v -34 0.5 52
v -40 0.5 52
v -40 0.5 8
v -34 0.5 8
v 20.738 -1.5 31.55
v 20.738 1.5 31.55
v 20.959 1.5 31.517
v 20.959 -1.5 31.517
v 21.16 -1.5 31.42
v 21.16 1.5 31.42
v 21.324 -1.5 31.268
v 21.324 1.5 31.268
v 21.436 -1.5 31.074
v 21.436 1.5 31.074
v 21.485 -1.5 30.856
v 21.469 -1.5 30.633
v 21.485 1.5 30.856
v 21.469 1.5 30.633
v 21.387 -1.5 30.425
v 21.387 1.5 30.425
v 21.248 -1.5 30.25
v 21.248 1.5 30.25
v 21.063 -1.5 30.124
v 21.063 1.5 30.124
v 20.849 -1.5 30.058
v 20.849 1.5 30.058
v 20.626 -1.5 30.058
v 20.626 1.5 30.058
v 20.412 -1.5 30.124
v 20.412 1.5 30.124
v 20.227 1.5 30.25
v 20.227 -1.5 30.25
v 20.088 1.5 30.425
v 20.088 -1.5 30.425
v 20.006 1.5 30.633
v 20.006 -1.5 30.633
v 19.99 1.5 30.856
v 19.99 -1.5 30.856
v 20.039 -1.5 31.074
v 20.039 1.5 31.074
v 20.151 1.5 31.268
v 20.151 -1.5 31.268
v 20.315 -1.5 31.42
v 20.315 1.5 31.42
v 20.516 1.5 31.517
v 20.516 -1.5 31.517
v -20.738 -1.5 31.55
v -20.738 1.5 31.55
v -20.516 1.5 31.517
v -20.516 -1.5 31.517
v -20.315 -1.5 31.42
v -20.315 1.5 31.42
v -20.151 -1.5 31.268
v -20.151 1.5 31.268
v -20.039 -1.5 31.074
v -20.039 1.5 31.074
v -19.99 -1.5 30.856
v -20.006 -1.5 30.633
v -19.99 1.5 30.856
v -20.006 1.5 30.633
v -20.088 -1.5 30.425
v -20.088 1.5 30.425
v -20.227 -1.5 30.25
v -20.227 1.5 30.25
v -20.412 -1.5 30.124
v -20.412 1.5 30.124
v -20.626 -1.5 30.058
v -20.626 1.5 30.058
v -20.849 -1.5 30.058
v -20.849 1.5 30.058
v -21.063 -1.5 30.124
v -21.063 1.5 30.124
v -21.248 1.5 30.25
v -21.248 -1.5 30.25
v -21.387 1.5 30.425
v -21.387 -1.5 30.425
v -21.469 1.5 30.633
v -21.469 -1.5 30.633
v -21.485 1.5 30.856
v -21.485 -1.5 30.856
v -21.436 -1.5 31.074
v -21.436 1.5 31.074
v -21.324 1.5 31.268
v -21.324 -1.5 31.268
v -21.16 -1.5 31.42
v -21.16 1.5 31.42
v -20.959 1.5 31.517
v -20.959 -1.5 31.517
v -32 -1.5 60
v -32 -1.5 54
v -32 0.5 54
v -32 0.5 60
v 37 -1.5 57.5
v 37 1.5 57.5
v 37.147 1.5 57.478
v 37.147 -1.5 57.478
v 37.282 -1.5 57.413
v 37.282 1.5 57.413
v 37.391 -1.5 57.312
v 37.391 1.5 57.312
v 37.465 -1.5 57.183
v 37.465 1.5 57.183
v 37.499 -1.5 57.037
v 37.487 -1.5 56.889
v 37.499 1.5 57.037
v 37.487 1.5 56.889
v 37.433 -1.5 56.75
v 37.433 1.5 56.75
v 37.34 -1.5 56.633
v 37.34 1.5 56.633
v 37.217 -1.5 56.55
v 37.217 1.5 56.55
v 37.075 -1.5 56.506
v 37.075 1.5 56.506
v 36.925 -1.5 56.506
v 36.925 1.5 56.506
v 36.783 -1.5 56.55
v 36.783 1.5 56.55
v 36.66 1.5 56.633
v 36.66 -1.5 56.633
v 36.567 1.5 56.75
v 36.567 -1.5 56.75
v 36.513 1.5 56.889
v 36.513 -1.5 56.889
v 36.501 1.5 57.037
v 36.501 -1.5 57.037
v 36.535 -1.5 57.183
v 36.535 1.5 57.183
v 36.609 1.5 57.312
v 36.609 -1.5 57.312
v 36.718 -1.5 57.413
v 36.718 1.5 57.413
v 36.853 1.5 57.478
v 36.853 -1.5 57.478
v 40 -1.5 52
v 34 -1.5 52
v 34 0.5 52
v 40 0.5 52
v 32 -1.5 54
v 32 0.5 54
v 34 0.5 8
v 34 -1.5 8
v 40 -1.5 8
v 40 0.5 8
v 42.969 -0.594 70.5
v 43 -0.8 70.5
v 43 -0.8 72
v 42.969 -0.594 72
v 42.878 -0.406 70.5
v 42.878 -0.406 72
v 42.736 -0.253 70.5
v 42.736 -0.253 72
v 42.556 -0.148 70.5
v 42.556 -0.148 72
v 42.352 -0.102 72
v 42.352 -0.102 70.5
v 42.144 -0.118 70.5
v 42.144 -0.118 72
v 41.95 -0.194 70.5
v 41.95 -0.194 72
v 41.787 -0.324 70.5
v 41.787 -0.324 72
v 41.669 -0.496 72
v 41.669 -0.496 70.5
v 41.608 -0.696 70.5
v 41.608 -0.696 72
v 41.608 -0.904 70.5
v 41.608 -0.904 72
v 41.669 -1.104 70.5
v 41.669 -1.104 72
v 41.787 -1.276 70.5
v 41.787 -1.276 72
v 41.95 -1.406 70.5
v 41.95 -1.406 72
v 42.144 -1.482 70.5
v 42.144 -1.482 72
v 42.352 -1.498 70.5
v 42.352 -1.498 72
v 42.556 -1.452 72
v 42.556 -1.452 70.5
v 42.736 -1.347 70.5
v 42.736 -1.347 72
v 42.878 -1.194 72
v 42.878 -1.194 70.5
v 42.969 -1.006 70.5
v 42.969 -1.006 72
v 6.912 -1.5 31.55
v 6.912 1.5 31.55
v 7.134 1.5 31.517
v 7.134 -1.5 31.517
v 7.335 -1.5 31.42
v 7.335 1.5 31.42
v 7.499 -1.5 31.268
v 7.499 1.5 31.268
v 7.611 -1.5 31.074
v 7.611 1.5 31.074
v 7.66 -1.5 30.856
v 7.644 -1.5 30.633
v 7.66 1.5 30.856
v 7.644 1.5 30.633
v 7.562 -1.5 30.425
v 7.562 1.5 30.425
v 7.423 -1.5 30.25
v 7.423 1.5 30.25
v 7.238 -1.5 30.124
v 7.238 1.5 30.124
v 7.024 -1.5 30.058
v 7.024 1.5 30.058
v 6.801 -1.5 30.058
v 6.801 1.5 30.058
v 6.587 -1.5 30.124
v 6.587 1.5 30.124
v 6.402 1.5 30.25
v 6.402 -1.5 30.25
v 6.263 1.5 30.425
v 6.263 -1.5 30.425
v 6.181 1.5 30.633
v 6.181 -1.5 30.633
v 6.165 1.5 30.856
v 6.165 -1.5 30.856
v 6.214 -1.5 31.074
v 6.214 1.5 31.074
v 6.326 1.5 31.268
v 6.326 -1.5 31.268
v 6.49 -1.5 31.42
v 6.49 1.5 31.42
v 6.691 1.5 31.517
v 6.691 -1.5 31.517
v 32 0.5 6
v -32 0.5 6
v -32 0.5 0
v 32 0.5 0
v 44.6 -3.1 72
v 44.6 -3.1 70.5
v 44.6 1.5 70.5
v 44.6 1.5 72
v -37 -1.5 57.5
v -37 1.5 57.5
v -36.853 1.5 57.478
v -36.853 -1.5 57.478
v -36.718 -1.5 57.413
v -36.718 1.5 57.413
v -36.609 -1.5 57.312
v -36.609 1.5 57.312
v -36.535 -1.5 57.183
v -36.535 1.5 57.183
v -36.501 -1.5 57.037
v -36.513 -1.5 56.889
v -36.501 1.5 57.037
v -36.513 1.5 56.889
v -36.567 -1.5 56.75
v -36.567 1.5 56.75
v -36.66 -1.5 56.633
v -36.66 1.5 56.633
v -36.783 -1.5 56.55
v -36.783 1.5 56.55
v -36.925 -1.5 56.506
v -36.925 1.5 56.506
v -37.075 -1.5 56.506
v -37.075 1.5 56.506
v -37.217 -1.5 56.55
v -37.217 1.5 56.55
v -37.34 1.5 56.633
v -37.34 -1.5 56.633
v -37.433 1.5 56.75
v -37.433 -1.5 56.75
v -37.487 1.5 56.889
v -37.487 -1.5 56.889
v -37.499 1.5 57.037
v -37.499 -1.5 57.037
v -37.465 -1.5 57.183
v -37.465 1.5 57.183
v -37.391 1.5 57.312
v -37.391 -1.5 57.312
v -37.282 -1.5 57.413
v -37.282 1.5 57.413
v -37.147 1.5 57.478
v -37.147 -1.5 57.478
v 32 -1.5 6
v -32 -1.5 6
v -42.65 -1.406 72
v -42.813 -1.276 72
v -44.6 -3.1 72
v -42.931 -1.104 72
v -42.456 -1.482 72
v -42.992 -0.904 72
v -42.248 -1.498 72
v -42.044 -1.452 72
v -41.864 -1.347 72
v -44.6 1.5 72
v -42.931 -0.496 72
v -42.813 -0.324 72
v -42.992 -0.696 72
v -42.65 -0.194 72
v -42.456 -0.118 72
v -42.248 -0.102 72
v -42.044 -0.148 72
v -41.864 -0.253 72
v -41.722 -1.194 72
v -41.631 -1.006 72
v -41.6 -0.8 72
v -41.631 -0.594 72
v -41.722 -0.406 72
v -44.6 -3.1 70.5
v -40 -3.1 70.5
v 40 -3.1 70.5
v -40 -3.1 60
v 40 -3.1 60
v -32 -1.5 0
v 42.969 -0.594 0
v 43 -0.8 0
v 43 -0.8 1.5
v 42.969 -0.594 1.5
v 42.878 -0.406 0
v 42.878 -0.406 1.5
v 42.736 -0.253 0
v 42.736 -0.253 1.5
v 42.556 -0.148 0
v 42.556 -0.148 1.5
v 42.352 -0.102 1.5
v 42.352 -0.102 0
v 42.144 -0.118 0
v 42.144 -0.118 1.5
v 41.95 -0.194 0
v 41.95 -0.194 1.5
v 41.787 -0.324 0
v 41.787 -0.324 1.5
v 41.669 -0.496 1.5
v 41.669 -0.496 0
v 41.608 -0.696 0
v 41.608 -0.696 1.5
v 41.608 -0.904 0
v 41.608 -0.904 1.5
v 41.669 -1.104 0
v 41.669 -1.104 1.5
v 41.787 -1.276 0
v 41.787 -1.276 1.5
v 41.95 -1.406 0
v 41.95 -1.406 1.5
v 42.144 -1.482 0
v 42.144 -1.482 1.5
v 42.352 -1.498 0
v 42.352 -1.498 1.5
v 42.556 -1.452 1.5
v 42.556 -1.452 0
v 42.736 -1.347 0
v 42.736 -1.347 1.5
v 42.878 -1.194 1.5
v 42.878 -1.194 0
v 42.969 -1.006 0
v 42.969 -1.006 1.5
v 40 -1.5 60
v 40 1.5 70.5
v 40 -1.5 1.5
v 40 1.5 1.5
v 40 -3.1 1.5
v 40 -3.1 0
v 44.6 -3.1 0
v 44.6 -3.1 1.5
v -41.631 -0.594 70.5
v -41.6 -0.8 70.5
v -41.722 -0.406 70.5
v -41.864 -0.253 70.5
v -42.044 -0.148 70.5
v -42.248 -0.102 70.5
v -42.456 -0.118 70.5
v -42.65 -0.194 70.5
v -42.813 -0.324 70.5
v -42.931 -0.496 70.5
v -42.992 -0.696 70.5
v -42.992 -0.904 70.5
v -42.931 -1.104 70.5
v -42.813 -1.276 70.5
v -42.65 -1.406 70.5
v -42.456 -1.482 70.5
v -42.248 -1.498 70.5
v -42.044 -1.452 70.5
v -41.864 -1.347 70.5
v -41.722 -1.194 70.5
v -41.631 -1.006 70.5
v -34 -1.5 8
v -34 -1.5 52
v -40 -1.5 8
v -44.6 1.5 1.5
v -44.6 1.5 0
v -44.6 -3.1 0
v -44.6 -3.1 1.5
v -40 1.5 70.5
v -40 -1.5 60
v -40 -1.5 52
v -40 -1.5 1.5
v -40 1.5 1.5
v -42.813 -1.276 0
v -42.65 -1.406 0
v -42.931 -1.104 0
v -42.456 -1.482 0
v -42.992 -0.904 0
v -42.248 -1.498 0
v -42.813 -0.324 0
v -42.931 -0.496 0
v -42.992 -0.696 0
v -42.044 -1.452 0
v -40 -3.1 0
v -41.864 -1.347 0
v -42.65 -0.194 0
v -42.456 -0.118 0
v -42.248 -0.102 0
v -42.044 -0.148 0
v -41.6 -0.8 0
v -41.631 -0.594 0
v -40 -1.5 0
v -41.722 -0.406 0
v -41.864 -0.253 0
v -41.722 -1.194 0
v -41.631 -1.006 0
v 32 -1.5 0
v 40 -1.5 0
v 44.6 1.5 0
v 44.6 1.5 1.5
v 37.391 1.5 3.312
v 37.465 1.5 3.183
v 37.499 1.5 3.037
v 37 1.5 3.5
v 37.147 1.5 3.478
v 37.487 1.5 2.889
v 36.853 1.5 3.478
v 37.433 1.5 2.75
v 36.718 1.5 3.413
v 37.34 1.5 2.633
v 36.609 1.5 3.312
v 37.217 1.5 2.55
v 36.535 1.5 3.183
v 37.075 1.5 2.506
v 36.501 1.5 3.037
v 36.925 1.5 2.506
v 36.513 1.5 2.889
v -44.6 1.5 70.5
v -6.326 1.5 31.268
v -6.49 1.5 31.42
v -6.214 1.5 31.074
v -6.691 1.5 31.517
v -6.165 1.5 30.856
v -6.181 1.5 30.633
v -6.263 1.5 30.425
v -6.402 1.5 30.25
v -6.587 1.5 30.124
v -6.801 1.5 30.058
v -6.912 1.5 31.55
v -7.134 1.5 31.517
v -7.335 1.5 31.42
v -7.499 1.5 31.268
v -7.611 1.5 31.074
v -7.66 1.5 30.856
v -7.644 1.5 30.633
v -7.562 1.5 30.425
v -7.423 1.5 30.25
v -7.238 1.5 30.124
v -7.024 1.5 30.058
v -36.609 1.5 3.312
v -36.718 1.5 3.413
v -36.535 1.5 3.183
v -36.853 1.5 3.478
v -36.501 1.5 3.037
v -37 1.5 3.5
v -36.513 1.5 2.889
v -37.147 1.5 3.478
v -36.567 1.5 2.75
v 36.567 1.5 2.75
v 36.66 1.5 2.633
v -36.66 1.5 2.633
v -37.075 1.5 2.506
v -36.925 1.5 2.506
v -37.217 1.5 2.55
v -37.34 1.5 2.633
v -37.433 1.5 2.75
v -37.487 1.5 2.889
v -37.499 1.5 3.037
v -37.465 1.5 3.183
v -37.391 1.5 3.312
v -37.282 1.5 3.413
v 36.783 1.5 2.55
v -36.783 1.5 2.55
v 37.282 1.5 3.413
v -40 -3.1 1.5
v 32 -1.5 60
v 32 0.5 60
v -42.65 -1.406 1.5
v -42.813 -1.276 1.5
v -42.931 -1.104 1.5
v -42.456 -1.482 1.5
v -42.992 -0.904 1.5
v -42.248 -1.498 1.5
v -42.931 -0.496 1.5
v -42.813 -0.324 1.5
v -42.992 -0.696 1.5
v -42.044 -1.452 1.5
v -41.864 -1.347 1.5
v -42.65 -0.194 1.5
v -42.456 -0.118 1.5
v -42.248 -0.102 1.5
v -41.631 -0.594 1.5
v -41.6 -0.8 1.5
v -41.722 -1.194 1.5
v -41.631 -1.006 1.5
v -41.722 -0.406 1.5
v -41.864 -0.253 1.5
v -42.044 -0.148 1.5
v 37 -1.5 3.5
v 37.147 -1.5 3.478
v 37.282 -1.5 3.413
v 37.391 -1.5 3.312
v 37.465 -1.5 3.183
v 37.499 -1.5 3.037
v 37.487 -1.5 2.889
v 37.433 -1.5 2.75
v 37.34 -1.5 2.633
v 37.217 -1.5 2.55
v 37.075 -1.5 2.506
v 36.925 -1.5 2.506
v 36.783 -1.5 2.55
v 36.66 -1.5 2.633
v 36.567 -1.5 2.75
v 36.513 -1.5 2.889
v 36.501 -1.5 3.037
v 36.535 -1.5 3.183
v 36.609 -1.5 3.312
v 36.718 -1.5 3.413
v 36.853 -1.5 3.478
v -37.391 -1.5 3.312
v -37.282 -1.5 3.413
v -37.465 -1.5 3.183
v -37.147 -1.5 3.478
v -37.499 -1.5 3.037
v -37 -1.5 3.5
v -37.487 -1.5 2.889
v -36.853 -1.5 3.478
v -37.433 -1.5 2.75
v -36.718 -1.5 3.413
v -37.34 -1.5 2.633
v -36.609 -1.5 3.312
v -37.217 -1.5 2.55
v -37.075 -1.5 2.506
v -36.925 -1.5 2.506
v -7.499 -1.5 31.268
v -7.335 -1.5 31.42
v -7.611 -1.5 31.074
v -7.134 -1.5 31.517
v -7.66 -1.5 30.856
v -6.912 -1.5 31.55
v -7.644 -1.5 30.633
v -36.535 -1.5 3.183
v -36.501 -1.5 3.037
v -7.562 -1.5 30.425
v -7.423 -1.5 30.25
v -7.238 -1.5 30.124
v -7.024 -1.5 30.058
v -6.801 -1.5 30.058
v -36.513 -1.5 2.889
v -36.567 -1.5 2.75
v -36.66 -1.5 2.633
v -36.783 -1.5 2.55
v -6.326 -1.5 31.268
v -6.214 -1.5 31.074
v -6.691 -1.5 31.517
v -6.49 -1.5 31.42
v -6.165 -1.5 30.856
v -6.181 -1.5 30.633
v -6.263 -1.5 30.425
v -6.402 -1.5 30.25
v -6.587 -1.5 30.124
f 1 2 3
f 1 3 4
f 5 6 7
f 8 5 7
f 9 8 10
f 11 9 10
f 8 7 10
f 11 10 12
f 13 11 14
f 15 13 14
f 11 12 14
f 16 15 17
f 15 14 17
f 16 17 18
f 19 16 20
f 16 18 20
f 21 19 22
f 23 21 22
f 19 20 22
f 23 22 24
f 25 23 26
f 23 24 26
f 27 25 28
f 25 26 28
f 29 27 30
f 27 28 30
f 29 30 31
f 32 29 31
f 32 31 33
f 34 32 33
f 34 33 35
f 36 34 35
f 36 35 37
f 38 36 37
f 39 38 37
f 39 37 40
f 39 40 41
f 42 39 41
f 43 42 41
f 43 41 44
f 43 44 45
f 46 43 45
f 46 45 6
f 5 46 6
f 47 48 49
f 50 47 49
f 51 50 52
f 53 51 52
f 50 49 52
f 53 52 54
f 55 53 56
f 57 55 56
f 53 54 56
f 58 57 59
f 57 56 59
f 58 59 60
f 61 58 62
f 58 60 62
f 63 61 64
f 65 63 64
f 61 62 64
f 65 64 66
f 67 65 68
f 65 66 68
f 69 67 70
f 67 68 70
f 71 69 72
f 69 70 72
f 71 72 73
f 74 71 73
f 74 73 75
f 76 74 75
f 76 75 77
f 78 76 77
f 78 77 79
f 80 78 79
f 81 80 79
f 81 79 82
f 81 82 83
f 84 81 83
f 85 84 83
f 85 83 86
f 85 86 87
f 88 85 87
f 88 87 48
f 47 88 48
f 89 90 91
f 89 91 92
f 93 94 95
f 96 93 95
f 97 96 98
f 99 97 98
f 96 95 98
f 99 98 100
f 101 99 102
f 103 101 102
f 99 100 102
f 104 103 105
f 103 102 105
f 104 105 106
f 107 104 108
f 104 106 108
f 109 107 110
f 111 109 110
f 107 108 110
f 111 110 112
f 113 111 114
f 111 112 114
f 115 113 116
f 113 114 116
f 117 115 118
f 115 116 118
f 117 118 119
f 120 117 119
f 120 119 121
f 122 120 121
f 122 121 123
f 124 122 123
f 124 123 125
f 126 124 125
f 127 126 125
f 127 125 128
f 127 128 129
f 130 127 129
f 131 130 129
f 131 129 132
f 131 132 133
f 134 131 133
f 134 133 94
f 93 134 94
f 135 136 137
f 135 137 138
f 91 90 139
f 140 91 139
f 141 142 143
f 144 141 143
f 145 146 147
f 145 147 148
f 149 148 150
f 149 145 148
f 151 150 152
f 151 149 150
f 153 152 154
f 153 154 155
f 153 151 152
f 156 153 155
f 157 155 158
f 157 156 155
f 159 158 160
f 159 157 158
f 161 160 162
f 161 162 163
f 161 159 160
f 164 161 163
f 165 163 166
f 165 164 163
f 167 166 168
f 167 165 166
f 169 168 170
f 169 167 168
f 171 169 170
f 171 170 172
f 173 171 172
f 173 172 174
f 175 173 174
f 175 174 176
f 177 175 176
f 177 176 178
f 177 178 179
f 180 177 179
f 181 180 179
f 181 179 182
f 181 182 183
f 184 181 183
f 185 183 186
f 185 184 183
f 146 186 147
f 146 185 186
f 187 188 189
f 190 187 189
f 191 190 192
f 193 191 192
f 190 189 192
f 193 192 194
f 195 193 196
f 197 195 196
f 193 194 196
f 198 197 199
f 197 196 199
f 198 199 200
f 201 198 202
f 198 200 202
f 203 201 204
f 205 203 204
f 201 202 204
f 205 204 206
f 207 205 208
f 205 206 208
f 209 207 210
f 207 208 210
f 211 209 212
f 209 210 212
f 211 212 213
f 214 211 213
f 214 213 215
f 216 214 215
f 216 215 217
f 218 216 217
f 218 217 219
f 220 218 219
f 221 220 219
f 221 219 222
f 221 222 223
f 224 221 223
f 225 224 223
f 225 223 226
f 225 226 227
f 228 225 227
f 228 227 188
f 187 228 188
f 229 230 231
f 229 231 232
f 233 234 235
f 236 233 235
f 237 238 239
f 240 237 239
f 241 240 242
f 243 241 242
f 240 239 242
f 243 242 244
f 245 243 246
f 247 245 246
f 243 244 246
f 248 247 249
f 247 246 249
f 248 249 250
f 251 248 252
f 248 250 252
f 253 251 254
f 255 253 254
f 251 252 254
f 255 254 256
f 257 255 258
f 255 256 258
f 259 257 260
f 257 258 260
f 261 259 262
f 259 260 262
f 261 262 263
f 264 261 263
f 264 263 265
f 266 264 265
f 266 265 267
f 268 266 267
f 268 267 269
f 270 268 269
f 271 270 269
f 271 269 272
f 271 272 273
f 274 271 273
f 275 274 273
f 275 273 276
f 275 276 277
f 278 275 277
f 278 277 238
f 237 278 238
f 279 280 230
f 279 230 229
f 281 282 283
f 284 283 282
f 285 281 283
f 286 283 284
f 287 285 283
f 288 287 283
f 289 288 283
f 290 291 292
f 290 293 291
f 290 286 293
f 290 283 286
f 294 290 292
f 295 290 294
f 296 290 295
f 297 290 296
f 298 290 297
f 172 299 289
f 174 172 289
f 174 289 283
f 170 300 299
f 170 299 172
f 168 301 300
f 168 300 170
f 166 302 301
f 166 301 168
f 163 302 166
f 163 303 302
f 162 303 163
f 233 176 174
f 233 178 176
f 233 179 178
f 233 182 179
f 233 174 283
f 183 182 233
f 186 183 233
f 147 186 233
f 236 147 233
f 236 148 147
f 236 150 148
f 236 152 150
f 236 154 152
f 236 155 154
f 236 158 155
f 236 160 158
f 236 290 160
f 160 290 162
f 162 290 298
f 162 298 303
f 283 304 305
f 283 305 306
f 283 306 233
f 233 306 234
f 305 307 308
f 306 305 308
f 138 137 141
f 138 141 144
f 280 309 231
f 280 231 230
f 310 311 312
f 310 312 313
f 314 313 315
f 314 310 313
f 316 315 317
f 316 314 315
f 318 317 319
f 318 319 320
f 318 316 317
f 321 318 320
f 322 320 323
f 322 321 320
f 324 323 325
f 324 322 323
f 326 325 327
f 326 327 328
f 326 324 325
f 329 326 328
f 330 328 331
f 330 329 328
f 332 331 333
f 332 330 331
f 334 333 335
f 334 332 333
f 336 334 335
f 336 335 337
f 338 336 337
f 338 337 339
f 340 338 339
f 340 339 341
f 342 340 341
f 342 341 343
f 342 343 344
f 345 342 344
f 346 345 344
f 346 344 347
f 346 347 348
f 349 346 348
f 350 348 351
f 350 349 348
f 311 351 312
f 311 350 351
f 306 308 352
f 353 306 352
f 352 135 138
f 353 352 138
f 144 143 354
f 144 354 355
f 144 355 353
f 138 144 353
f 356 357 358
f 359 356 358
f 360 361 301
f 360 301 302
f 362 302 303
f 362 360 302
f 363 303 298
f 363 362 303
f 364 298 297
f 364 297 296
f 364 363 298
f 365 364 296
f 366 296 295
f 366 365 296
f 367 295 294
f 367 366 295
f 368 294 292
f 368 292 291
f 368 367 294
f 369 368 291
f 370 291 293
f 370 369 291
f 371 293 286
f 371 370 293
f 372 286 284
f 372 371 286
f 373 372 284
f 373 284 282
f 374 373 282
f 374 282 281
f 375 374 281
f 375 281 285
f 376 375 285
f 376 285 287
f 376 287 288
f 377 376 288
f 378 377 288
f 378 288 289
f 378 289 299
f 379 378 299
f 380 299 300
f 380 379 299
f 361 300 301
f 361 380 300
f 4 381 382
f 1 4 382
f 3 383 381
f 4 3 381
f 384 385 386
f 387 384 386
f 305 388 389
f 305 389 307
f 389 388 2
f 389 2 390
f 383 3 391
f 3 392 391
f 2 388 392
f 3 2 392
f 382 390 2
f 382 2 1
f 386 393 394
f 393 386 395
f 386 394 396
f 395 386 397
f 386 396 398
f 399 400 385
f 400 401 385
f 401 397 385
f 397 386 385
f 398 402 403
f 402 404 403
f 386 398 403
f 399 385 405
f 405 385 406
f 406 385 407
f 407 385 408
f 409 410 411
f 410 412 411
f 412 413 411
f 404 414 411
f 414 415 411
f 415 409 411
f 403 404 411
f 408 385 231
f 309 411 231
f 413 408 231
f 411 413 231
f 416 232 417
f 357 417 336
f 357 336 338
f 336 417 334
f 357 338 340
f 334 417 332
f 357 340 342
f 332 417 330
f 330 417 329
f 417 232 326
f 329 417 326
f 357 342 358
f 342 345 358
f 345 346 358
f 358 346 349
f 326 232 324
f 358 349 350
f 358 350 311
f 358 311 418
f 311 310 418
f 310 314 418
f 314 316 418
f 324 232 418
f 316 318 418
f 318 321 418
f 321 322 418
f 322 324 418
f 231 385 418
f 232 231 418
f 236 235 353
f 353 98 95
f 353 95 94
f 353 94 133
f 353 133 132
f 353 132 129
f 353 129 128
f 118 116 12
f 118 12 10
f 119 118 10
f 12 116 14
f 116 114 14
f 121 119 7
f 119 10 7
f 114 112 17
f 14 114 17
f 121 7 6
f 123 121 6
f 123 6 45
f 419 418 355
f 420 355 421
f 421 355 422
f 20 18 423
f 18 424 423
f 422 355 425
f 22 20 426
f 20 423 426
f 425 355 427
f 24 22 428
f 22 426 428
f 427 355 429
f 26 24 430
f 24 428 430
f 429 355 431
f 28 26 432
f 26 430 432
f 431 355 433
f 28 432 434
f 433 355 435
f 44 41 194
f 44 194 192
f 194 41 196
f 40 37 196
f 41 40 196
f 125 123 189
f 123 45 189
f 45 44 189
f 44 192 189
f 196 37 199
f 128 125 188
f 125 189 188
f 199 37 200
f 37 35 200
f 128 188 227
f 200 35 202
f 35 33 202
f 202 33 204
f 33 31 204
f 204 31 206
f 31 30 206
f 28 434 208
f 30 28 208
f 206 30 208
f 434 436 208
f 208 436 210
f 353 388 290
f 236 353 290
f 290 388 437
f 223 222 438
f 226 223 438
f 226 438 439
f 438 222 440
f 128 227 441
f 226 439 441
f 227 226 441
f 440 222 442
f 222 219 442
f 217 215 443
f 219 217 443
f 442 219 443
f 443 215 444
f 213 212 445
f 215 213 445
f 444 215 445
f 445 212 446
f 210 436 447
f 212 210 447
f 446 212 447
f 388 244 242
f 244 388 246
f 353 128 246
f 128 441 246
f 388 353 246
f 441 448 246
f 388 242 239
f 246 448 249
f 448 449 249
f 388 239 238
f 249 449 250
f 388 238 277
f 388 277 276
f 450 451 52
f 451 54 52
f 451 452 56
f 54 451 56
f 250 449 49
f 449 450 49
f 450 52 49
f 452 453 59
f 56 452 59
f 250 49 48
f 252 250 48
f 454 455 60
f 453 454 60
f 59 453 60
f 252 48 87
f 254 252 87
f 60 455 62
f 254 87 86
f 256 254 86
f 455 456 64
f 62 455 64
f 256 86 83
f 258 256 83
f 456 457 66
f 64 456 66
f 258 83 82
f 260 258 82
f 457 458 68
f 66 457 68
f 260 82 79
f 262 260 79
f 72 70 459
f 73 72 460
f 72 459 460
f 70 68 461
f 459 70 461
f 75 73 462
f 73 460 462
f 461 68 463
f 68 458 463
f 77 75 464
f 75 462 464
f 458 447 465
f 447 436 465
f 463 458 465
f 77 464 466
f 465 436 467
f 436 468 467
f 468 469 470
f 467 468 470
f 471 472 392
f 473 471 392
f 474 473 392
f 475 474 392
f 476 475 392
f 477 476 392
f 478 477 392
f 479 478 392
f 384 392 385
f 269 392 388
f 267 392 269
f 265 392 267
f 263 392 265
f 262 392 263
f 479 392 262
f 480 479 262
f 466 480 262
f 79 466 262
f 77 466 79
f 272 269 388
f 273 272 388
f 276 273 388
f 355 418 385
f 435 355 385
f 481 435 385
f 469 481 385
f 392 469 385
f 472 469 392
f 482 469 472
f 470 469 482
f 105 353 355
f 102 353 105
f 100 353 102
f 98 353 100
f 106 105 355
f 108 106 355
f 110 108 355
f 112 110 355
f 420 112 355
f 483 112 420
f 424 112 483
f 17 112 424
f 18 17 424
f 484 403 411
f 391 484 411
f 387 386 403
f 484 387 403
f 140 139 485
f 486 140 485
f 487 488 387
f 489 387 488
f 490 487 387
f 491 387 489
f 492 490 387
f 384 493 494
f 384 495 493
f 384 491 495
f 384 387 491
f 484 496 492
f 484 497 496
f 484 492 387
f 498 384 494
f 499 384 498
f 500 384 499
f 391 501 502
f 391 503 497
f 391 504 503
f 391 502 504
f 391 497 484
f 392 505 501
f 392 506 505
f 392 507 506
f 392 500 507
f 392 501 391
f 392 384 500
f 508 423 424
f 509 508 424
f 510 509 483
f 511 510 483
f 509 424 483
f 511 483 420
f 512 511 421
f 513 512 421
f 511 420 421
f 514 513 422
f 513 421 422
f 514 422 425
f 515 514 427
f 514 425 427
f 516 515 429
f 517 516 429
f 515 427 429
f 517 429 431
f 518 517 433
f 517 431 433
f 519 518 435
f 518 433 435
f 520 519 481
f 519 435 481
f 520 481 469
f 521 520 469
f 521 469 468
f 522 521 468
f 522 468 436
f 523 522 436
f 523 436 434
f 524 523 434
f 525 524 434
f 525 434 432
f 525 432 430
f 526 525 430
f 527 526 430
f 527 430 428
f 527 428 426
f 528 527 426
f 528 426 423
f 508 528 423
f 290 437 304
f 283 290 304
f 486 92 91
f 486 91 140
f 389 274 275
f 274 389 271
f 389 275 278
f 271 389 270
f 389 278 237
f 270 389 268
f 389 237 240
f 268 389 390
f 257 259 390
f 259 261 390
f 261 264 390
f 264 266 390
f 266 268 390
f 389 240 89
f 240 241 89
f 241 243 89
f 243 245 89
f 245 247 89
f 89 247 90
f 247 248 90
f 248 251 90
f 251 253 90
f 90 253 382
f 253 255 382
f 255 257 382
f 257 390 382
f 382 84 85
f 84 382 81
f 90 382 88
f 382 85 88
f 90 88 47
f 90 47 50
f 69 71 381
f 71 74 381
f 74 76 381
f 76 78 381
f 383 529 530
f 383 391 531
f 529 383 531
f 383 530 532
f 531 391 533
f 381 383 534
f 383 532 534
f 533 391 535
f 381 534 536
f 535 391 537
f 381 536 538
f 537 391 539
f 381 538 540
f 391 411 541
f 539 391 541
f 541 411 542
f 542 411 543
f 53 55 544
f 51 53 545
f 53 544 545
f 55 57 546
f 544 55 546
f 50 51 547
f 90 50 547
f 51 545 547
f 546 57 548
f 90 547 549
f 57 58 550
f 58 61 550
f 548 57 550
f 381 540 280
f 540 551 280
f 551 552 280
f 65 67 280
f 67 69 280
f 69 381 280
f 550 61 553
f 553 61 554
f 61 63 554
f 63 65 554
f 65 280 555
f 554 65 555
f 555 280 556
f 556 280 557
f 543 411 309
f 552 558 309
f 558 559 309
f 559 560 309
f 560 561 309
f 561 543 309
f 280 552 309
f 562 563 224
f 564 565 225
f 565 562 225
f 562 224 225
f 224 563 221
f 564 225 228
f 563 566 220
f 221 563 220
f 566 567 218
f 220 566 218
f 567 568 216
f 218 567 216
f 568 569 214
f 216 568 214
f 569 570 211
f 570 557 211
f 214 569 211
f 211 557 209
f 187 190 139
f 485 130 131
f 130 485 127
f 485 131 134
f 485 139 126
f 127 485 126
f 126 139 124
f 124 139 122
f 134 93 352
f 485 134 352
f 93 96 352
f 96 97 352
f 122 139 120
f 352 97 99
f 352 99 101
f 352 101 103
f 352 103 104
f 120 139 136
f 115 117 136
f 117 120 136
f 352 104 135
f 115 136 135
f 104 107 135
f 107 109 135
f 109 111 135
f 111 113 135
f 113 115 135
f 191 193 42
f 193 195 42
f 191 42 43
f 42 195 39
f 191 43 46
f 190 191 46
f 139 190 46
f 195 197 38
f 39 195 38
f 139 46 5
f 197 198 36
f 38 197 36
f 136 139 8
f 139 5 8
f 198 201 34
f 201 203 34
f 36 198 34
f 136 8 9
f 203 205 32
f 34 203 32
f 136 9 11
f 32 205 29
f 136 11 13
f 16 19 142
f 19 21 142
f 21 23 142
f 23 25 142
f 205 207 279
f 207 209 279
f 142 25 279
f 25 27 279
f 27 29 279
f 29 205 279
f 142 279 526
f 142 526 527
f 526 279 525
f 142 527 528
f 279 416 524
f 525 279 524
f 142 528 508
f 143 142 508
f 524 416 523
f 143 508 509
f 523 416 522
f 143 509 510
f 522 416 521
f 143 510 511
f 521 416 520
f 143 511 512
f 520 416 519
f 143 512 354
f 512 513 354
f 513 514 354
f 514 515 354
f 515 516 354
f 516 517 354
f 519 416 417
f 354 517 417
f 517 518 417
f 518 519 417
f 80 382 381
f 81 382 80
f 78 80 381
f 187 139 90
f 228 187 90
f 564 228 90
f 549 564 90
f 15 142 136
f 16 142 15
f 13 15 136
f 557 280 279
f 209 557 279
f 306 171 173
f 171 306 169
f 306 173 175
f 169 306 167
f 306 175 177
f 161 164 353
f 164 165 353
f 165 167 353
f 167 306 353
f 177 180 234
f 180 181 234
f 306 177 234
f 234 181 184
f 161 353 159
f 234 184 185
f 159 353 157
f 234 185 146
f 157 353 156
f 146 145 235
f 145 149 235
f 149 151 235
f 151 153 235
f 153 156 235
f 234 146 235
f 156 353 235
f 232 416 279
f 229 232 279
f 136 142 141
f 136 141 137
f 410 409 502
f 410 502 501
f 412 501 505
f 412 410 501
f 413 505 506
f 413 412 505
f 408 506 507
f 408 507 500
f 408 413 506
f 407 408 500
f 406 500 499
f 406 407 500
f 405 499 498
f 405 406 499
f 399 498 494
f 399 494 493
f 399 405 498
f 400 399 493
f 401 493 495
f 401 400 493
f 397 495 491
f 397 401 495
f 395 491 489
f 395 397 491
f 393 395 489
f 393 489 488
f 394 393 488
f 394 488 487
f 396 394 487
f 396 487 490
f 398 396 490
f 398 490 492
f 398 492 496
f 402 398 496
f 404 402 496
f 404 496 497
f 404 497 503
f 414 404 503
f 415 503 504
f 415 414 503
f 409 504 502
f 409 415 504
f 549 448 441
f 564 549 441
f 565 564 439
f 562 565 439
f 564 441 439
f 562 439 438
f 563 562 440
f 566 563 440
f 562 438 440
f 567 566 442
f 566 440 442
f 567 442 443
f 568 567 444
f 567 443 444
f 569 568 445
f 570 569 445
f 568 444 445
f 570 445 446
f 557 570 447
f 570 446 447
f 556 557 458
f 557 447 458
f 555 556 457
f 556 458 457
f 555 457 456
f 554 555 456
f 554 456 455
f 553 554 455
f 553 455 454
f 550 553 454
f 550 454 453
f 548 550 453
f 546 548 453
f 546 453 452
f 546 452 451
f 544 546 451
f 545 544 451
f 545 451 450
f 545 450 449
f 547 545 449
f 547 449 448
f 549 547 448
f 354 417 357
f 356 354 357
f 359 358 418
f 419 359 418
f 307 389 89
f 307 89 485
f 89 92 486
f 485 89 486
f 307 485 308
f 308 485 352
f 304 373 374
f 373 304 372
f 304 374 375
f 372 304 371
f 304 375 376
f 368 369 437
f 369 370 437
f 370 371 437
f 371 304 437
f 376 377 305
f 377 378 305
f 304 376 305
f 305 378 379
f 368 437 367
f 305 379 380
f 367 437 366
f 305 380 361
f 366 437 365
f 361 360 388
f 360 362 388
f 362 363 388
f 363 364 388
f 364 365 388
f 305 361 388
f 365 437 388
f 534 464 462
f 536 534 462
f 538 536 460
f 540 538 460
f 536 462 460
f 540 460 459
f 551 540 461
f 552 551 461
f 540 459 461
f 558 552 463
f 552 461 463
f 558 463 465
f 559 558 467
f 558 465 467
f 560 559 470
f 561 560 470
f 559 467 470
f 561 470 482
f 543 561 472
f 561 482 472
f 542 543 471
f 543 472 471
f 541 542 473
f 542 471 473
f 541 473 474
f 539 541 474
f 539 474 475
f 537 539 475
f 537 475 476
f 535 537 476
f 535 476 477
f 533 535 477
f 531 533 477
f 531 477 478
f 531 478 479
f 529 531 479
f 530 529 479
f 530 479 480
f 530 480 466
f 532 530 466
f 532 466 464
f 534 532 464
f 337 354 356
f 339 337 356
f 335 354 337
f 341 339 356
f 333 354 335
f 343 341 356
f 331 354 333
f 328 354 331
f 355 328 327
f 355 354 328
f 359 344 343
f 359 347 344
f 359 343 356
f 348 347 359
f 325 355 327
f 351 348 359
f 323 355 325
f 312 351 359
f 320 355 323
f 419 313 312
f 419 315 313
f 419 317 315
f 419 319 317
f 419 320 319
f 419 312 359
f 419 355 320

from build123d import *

# Parameters (mm, degrees)
SKETCH_1_W          = 80
SKETCH_1_H          = 3
EXTRUDE_1_DEPTH     = 60
SKETCH_4_R          = 0.5
CUT_EXTRUDE_1_DEPTH = 73.173402303
SKETCH_5_W          = 64
SKETCH_5_H          = 6
SKETCH_5_W_2        = 6
SKETCH_5_H_2        = 44
CUT_EXTRUDE_4_DEPTH = 2
EXTRUDE_START       = -60
SKETCH_6_R          = 0.7
EXTRUDE_2_DEPTH     = 1.5
EXTRUDE_3_DEPTH     = 12
EXTRUDE_START_2     = 10.5
SKETCH_6_4_R        = 0.7
EXTRUDE_4_DEPTH     = 1.5
SKETCH_7_R          = 0.75
CUT_EXTRUDE_5_DEPTH = 85.819337418


with BuildPart() as part:
    # 草图1 → 凸台-拉伸1 (new body)
    with BuildSketch(Plane.XY):
        Rectangle(SKETCH_1_W, SKETCH_1_H)
    extrude(amount=EXTRUDE_1_DEPTH)

    # 草图4 → 切除-拉伸1 (cut, through all)
    with BuildSketch(Plane(origin=(0, 1.5, 0), x_dir=(1, 0, 0), z_dir=(0, 1, 0))):
        with Locations(Location((-37, -57, 0), (0, 0, 270))):
            Circle(SKETCH_4_R)
        with Locations(Location((37, -57, 0), (0, 0, 270))):
            Circle(SKETCH_4_R)
        with Locations(Location((-37, -3, 0), (0, 0, 270))):
            Circle(SKETCH_4_R)
        with Locations(Location((37, -3, 0), (0, 0, 270))):
            Circle(SKETCH_4_R)
    extrude(amount=-CUT_EXTRUDE_1_DEPTH, mode=Mode.SUBTRACT)

    # 草图5 → 切除-拉伸4 (cut)
    with BuildSketch(Plane.XZ.offset(1.5)):
        with Locations((0, 57)):
            Rectangle(SKETCH_5_W, SKETCH_5_H)
        with Locations((37, 30)):
            Rectangle(SKETCH_5_W_2, SKETCH_5_H_2)
        with Locations((0, 3)):
            Rectangle(SKETCH_5_W, SKETCH_5_H)
        with Locations((-37, 30)):
            Rectangle(SKETCH_5_W_2, SKETCH_5_H_2)
    extrude(amount=-CUT_EXTRUDE_4_DEPTH, mode=Mode.SUBTRACT)

    # 草图6 → 凸台-拉伸2 (add)
    # profile 1 of 2: a face of its own
    with BuildSketch(Plane.XY.offset(60).offset(EXTRUDE_START)):
        Polygon((-40, -1.5), (-40, 1.5), (-44.6, 1.5), (-44.6, -3.1), (-40, -3.1), align=None)
        with Locations((-42.3, -0.8)):
            Circle(SKETCH_6_R, mode=Mode.SUBTRACT)
    # profile 2 of 2: a face of its own
    with BuildSketch(Plane.XY.offset(60).offset(EXTRUDE_START)):
        Polygon((44.6, 1.5), (40, 1.5), (40, -1.5), (40, -3.1), (44.6, -3.1), align=None)
        with Locations((42.3, -0.8)):
            Circle(SKETCH_6_R, mode=Mode.SUBTRACT)
    extrude(amount=EXTRUDE_2_DEPTH)

    # 草图6<3> → 凸台-拉伸3 (add)
    with BuildSketch(Plane.XY.offset(60)):
        Polygon((-32, -1.5), (-40, -1.5), (-40, -3.1), (40, -3.1), (40, -1.5), (32, -1.5), (32, 0.5), (-32, 0.5), align=None)
        Polygon((-40, -1.5), (-32, -1.5), (-32, 0.5), (32, 0.5), (32, -1.5), (40, -1.5), (40, 1.5), (-40, 1.5), align=None)
    extrude(amount=EXTRUDE_3_DEPTH)

    # 草图6<4> → 凸台-拉伸4 (add)
    # profile 1 of 2: a face of its own
    with BuildSketch(Plane.XY.offset(60).offset(EXTRUDE_START_2)):
        Polygon((-40, -1.5), (-40, 1.5), (-44.6, 1.5), (-44.6, -3.1), (-40, -3.1), align=None)
        with Locations((-42.3, -0.8)):
            Circle(SKETCH_6_4_R, mode=Mode.SUBTRACT)
    # profile 2 of 2: a face of its own
    with BuildSketch(Plane.XY.offset(60).offset(EXTRUDE_START_2)):
        Polygon((44.6, 1.5), (40, 1.5), (40, -1.5), (40, -3.1), (44.6, -3.1), align=None)
        with Locations((42.3, -0.8)):
            Circle(SKETCH_6_4_R, mode=Mode.SUBTRACT)
    extrude(amount=EXTRUDE_4_DEPTH)

    # 草图7 → 切除-拉伸5 (cut, through all)
    with BuildSketch(Plane(origin=(0, 1.5, 0), x_dir=(1, 0, 0), z_dir=(0, 1, 0))):
        with Locations(Location((20.7375, -30.8, 0), (0, 0, 270))):
            Circle(SKETCH_7_R)
        with Locations(Location((6.9125, -30.8, 0), (0, 0, 270))):
            Circle(SKETCH_7_R)
        with Locations(Location((-6.9125, -30.8, 0), (0, 0, 270))):
            Circle(SKETCH_7_R)
        with Locations(Location((-20.7375, -30.8, 0), (0, 0, 270))):
            Circle(SKETCH_7_R)
    extrude(amount=-CUT_EXTRUDE_5_DEPTH, mode=Mode.SUBTRACT)


solid = part.part
